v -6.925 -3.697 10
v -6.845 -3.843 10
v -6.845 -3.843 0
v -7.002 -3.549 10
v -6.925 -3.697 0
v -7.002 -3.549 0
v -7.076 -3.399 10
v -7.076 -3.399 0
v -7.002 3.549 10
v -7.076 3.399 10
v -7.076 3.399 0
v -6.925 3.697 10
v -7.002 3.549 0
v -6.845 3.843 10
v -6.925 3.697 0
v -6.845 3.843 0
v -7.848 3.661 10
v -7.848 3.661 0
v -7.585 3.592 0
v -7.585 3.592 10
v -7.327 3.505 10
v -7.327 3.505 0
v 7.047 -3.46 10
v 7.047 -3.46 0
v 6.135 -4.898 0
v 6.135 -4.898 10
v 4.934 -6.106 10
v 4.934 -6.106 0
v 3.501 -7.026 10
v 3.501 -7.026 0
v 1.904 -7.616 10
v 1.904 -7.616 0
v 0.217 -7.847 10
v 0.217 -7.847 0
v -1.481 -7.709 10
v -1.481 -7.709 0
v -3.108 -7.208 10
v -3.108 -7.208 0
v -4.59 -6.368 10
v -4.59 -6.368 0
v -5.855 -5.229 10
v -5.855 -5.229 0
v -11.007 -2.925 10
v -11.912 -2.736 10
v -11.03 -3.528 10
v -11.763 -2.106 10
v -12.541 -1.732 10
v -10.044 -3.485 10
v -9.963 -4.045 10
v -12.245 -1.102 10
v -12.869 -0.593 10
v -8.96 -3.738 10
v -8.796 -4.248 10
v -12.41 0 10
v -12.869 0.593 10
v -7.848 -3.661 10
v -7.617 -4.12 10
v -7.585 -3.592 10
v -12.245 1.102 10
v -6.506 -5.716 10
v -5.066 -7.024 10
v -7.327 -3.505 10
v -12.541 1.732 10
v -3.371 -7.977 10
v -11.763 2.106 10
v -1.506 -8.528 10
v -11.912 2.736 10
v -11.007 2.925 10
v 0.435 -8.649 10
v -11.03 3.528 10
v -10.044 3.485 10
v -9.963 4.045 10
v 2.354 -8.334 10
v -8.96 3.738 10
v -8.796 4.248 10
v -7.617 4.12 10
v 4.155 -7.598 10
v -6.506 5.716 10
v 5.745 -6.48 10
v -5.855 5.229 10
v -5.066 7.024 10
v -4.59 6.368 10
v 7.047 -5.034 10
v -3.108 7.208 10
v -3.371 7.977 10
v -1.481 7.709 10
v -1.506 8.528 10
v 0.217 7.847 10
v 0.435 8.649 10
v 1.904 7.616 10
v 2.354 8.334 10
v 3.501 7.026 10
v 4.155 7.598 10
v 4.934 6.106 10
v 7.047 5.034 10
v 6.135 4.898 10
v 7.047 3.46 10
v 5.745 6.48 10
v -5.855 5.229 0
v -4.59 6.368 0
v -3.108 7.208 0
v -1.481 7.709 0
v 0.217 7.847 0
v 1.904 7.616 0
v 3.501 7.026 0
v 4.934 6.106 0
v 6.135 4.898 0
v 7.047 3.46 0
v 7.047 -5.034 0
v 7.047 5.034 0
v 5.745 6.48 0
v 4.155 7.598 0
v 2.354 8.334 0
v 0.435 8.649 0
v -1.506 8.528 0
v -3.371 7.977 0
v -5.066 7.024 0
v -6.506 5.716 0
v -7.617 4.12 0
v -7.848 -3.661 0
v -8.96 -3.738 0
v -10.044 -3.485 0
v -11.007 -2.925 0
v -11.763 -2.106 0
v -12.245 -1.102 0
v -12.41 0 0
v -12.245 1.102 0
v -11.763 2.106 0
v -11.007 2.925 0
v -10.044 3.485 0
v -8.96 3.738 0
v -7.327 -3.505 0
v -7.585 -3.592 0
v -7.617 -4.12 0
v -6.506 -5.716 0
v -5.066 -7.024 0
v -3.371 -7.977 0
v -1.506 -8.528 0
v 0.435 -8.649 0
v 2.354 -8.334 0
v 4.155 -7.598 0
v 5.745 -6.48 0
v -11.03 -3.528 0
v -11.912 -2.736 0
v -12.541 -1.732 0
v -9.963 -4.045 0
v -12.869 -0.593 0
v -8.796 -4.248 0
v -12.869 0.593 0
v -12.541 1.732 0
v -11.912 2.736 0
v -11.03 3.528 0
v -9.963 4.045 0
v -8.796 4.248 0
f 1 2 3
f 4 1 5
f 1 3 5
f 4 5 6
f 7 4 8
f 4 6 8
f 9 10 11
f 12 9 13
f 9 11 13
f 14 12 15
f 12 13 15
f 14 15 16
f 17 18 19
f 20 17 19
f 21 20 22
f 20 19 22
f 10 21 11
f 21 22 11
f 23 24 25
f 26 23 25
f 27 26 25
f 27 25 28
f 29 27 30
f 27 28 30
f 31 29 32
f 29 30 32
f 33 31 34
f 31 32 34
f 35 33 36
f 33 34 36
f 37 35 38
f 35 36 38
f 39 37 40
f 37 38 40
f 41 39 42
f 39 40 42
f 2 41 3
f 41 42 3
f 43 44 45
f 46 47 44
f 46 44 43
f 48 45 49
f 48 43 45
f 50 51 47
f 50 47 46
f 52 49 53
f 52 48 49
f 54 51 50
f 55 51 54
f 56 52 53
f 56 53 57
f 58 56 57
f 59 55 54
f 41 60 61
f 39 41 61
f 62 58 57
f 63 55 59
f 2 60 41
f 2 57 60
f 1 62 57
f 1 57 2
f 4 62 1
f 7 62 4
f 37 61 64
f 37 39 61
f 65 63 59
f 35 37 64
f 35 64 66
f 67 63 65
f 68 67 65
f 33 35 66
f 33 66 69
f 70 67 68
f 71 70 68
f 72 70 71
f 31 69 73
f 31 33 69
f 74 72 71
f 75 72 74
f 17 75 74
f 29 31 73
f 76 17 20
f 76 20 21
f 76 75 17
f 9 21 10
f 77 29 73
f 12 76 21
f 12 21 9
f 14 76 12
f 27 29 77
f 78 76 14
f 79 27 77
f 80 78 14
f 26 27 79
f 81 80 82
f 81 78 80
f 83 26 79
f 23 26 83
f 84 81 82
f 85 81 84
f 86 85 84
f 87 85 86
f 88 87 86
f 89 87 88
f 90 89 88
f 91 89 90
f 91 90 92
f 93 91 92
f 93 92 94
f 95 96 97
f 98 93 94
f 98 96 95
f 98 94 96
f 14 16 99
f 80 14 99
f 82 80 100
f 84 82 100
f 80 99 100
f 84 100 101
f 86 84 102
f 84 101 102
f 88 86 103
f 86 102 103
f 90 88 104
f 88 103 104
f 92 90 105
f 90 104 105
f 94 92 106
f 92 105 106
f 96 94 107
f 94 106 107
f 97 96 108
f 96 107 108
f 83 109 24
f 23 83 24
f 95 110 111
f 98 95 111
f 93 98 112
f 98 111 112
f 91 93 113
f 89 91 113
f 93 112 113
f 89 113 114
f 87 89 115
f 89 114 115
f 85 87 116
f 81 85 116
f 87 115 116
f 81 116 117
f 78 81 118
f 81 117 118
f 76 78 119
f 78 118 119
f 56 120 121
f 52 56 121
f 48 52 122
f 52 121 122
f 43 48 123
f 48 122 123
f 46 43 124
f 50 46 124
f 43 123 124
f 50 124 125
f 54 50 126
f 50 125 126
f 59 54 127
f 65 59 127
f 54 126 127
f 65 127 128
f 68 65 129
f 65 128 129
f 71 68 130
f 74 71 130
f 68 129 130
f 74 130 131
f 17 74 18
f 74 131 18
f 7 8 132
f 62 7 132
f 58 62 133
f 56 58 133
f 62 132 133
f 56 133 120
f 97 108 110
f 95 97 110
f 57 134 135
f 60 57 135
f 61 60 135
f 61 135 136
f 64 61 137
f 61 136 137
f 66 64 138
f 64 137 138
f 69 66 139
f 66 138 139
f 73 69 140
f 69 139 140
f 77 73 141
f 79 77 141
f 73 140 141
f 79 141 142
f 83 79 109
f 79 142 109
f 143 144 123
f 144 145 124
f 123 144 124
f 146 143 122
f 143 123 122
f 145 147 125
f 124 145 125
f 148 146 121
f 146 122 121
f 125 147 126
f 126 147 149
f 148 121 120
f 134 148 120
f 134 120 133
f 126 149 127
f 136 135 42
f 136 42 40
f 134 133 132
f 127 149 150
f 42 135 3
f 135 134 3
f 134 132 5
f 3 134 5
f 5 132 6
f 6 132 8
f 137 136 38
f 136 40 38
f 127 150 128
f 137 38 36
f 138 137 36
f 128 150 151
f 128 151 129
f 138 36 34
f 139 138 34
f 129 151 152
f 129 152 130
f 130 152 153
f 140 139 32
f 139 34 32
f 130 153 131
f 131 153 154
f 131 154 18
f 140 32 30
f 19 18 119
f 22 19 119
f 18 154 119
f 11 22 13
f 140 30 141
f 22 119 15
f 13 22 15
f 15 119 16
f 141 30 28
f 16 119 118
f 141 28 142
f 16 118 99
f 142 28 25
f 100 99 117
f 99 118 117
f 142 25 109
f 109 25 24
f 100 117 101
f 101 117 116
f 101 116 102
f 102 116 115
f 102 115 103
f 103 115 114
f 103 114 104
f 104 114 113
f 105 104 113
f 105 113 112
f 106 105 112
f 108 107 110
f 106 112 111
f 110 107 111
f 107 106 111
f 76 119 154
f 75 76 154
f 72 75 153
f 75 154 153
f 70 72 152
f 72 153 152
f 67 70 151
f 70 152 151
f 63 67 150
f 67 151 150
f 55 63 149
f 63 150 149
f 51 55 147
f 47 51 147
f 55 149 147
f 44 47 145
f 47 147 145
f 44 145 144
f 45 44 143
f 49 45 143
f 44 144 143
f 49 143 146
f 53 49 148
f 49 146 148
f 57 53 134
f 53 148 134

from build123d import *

# Parameters (mm, degrees)
F1_DEPTH = 10
F6_DEPTH = 10


# Not quite as in the source:
# - a feature names something its author has since deleted; it is built from what else it names


with BuildPart() as f1:
    # F0 (on Top) → F1 (new body)
    with BuildSketch(Plane.XY):
        with BuildLine():
            ThreePointArc((-7.0759814838, 3.3989683789), (-6.9640481468, 3.6227797903), (-6.8450379627, 3.8429097425))
            ThreePointArc((-6.8450379627, 3.8429097425), (-7.2244510067, 4.0001671481), (-7.6172716975, 4.1200673333))
            ThreePointArc((-7.6172716975, 4.1200673333), (-7.7361486016, 3.8922728268), (-7.8482152186, 3.6610518743))
            ThreePointArc((-7.8482152186, 3.6610518743), (-7.4549529061, 3.5510643093), (-7.0759814838, 3.3989683789))
        make_face()
        with BuildLine():
            ThreePointArc((-7.6172716975, -4.1200673333), (-7.2244510067, -4.0001671481), (-6.8450379627, -3.8429097425))
            ThreePointArc((-6.8450379627, -3.8429097425), (-6.9640481468, -3.6227797903), (-7.0759814838, -3.3989683789))
            ThreePointArc((-7.0759814838, -3.3989683789), (-7.4549529061, -3.5510643093), (-7.8482152186, -3.6610518743))
            ThreePointArc((-7.8482152186, -3.6610518743), (-7.7361486016, -3.8922728268), (-7.6172716975, -4.1200673333))
        make_face()
        with BuildLine():
            ThreePointArc((-7.8482152186, 3.6610518743), (-7.7361486016, 3.8922728268), (-7.6172716975, 4.1200673333))
            ThreePointArc((-7.6172716975, 4.1200673333), (-12.9101260351, 0), (-7.6172716975, -4.1200673333))
            ThreePointArc((-7.6172716975, -4.1200673333), (-7.7361486016, -3.8922728268), (-7.8482152186, -3.6610518743))
            ThreePointArc((-7.8482152186, -3.6610518743), (-12.4101260351, 0), (-7.8482152186, 3.6610518743))
        make_face()
    extrude(amount=F1_DEPTH)


with BuildPart() as f2_1:
    # F2: copy of F1
    add(f1.part.moved(Location((-14.3, 0, 0))))


with BuildPart() as f3_1:
    # F3: copy of F2_1
    add(f2_1.part.moved(Location((-13, 0, 0))))


with BuildPart() as f1_1:
    add(f1.part)

    # F0 (on Top) → F6 (join)
    with BuildSketch(Plane.XY):
        with BuildLine():
            ThreePointArc((-6.8450379627, 3.8429097425), (0.2165563909, 7.8470123824), (7.0465658628, 3.4595389203))
            Line((7.0465658628, 3.4595389203), (7.0465658628, 5.0342519291))
            ThreePointArc((7.0465658628, 5.0342519291), (-0.5388503097, 8.6433456073), (-7.6172716975, 4.1200673333))
            ThreePointArc((-7.6172716975, 4.1200673333), (-7.2244510067, 4.0001671481), (-6.8450379627, 3.8429097425))
        make_face()
        with BuildLine():
            Line((7.0465658628, -5.0342519291), (7.0465658628, -3.4595389203))
            ThreePointArc((7.0465658628, -3.4595389203), (0.2165563909, -7.8470123824), (-6.8450379627, -3.8429097425))
            ThreePointArc((-6.8450379627, -3.8429097425), (-7.2244510067, -4.0001671481), (-7.6172716975, -4.1200673333))
            ThreePointArc((-7.6172716975, -4.1200673333), (-0.5388503097, -8.6433456073), (7.0465658628, -5.0342519291))
        make_face()
        with BuildLine():
            ThreePointArc((-7.0759814838, 3.3989683789), (-6.9640481468, 3.6227797903), (-6.8450379627, 3.8429097425))
            ThreePointArc((-6.8450379627, 3.8429097425), (-7.2244510067, 4.0001671481), (-7.6172716975, 4.1200673333))
            ThreePointArc((-7.6172716975, 4.1200673333), (-7.7361486016, 3.8922728268), (-7.8482152186, 3.6610518743))
            ThreePointArc((-7.8482152186, 3.6610518743), (-7.4549529061, 3.5510643093), (-7.0759814838, 3.3989683789))
        make_face()
        with BuildLine():
            ThreePointArc((-7.6172716975, -4.1200673333), (-7.2244510067, -4.0001671481), (-6.8450379627, -3.8429097425))
            ThreePointArc((-6.8450379627, -3.8429097425), (-6.9640481468, -3.6227797903), (-7.0759814838, -3.3989683789))
            ThreePointArc((-7.0759814838, -3.3989683789), (-7.4549529061, -3.5510643093), (-7.8482152186, -3.6610518743))
            ThreePointArc((-7.8482152186, -3.6610518743), (-7.7361486016, -3.8922728268), (-7.6172716975, -4.1200673333))
        make_face()
    extrude(amount=F6_DEPTH)


with BuildPart() as f7_1:
    # F7: copy of F1
    add(f1_1.part.moved(Location((-22.5, 0, 0))))


with BuildPart() as f8_1:
    # F8: copy of F1
    add(f1_1.part.moved(Location((0, 18.6, 0))))


with BuildPart() as f9_1:
    # F9: copy of F7_1
    add(f7_1.part.moved(Location((0, 20.1, 0))))


with BuildPart() as f10_1:
    # F10: copy of F7_1
    add(f7_1.part.moved(Location((0, -19.2, 0))))


with BuildPart() as f11_1:
    # F11: copy of F1
    add(f1_1.part.moved(Location((0, -19.5, 0))))


with BuildPart() as f12_1:
    # F12: copy of F1
    add(f1_1.part.moved(Location((25.2, 0, 0))))


solid = f1_1.part
